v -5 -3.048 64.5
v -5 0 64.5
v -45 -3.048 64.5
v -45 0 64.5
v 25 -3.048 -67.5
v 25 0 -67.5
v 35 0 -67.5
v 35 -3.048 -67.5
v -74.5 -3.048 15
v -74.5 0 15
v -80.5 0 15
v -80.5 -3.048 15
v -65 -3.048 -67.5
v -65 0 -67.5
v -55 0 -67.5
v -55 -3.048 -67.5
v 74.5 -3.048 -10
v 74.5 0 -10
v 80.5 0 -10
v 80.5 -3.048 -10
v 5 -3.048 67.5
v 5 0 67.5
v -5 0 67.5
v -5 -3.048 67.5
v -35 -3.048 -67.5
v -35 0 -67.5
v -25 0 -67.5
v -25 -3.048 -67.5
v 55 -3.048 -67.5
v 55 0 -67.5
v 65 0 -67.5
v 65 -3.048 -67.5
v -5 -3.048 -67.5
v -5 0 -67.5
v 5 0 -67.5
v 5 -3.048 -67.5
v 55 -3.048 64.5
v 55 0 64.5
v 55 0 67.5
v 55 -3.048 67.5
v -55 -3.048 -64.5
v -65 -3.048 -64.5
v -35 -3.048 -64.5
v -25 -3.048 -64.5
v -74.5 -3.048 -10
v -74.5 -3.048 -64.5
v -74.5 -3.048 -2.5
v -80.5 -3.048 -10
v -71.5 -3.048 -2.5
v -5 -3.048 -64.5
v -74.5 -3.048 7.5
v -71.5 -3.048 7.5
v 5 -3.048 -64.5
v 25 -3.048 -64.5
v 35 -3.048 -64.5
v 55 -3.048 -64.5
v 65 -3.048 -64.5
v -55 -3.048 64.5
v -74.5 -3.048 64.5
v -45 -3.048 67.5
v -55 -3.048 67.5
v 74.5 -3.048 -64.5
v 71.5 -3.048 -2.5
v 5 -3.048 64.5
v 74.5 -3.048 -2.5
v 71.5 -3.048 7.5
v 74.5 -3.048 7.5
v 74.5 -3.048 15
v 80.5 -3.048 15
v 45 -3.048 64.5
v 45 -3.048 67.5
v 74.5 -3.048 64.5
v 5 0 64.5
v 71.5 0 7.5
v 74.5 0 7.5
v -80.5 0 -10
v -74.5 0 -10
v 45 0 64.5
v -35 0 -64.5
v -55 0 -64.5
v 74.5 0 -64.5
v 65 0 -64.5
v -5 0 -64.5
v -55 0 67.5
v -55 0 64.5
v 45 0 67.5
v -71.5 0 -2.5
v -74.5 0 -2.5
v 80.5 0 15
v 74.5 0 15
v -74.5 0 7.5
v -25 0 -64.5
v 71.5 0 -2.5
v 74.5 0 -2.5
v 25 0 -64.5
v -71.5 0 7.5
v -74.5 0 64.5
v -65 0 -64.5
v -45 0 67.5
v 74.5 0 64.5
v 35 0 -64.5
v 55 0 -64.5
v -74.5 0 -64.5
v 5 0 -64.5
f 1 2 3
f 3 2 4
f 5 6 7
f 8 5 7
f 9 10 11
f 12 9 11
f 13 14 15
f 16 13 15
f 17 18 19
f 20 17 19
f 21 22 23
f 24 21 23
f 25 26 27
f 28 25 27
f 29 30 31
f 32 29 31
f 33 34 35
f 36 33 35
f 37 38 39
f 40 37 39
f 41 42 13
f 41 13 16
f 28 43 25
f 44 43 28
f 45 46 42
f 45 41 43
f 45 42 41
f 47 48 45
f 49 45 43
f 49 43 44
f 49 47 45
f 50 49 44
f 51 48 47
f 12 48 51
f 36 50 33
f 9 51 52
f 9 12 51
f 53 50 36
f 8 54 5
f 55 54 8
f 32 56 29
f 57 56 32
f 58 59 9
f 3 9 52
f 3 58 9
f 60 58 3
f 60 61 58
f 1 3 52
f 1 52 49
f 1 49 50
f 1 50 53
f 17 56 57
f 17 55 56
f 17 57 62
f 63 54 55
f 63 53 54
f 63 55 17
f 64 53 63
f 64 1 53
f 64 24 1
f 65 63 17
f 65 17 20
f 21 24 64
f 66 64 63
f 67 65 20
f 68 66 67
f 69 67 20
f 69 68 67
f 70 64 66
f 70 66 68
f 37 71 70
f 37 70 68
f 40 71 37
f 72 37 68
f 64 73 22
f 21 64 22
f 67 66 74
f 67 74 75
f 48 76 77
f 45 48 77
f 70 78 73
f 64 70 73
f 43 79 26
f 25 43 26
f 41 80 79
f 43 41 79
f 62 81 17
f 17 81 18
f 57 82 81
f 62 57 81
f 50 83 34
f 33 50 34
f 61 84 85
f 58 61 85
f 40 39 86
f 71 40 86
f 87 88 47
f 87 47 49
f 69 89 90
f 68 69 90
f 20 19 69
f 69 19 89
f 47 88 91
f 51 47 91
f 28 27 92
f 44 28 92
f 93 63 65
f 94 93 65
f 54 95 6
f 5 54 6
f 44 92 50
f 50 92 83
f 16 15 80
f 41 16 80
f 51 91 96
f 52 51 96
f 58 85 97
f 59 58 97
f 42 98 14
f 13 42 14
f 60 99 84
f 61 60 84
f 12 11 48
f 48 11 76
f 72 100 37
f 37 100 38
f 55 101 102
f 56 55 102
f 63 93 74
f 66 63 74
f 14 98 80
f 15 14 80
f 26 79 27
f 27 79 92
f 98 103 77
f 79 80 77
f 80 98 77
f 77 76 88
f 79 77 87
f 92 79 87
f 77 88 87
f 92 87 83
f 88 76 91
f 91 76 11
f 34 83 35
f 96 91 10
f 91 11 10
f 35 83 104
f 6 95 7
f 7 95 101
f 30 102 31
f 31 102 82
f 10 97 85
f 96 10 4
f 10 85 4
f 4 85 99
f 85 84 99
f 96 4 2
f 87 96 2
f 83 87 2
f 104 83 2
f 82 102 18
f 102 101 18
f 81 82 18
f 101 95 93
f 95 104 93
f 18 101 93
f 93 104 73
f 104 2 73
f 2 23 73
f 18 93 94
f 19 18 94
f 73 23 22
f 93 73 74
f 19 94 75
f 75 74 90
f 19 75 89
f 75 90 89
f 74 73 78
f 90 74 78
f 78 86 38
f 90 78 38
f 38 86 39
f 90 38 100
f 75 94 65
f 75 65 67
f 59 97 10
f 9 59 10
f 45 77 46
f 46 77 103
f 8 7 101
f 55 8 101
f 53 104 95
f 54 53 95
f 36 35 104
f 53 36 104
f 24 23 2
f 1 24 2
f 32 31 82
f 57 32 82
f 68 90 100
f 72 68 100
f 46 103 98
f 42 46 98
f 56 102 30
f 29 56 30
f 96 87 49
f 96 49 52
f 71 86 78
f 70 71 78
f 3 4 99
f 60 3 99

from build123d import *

# Parameters (mm, degrees)
F0_W     = 3.000019
F0_H     = 10.000005
F0_W_2   = 2.999994
F1_DEPTH = 3.048


with BuildPart() as f1:
    # F0 (on Front) → F1 (new body)
    with BuildSketch(Plane.XZ):
        Polygon((-74.500003, 64.499998), (-74.500003, 14.999995), (-80.499991, 14.999995), (-80.499991, -10.000005), (-74.500003, -10.000005), (-74.500003, -64.500023), (-64.999997, -64.500023), (-64.999997, -67.500017), (-54.999992, -67.500017), (-54.999992, -64.500023), (-34.999981, -64.500023), (-34.999981, -67.500017), (-25.000001, -67.500017), (-25.000001, -64.500023), (-4.99999, -64.500023), (-4.99999, -67.500017), (5.000015, -67.500017), (5.000015, -64.500023), (25.000001, -64.500023), (25.000001, -67.500017), (35.000006, -67.500017), (35.000006, -64.500023), (55.000017, -64.500023), (55.000017, -67.500017), (64.999997, -67.500017), (64.999997, -64.500023), (74.500003, -64.500023), (74.500003, -10.000005), (80.500017, -10.000005), (80.500017, 14.999995), (74.500003, 14.999995), (74.500003, 64.499998), (55.000017, 64.499998), (55.000017, 67.499992), (45.000012, 67.499992), (45.000012, 64.499998), (5.000015, 64.499998), (5.000015, 67.499992), (-4.99999, 67.499992), (-4.99999, 64.499998), (-44.999986, 64.499998), (-44.999986, 67.499992), (-54.999992, 67.499992), (-54.999992, 64.499998), align=None)
        with Locations((-72.999993, 2.499982)):
            Rectangle(F0_W, F0_H, mode=Mode.SUBTRACT)
        with Locations((73.000006, 2.499982)):
            Rectangle(F0_W_2, F0_H, mode=Mode.SUBTRACT)
    extrude(amount=F1_DEPTH)


solid = f1.part
